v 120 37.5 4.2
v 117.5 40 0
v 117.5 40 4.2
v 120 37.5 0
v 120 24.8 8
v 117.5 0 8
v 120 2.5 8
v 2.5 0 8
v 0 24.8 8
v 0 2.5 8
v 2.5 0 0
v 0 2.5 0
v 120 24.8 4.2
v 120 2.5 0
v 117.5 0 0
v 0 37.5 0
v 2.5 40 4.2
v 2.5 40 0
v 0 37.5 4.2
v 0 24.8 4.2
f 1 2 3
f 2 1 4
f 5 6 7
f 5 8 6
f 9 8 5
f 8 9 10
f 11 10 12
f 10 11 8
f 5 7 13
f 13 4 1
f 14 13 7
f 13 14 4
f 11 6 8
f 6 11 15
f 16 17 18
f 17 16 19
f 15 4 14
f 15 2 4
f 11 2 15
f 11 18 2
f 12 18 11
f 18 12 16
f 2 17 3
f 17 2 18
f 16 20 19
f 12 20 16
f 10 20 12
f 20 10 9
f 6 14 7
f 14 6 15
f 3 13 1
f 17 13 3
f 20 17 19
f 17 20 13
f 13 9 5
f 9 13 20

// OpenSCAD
$fn = 32;

// ----------------------------------------------------------------------
// Stepped bar: sidestep, 120 x 40 x 8/4.2 mm
// ----------------------------------------------------------------------

// --- parameters (mm) ---
bar_l = 120;              // bar length, X
bar_w = 40;               // bar width, Y
plate_t = 8;              // thickness of the thick zone, Z
thin_t = 4.2;             // thickness of the thin zone
corner_c = 2.5;           // corner chamfer of the bar
step_cut = 3.8;           // material removed from the thin zone
ledge_y = 24.8;           // start of the ledge from the front edge
depth_1 = 3.8;            // depth of cut 1 from the top face

profile = [[2.5, 0], [117.5, 0], [120, 2.5], [120, 37.5], [117.5, 40], [2.5, 40], [0, 37.5], [0, 2.5]];  // primary outline, 8 points, counter clockwise
void_1 = [[-1, 24.8], [121, 24.8], [121, 41], [-1, 41]];  // ledge cut along one edge, 4 points

// --- the one profile operation ---
difference() {
  linear_extrude(height = plate_t) polygon(points = profile);
  translate([0, 0, plate_t - depth_1])
    linear_extrude(height = depth_1 + 1) polygon(points = void_1);
}
